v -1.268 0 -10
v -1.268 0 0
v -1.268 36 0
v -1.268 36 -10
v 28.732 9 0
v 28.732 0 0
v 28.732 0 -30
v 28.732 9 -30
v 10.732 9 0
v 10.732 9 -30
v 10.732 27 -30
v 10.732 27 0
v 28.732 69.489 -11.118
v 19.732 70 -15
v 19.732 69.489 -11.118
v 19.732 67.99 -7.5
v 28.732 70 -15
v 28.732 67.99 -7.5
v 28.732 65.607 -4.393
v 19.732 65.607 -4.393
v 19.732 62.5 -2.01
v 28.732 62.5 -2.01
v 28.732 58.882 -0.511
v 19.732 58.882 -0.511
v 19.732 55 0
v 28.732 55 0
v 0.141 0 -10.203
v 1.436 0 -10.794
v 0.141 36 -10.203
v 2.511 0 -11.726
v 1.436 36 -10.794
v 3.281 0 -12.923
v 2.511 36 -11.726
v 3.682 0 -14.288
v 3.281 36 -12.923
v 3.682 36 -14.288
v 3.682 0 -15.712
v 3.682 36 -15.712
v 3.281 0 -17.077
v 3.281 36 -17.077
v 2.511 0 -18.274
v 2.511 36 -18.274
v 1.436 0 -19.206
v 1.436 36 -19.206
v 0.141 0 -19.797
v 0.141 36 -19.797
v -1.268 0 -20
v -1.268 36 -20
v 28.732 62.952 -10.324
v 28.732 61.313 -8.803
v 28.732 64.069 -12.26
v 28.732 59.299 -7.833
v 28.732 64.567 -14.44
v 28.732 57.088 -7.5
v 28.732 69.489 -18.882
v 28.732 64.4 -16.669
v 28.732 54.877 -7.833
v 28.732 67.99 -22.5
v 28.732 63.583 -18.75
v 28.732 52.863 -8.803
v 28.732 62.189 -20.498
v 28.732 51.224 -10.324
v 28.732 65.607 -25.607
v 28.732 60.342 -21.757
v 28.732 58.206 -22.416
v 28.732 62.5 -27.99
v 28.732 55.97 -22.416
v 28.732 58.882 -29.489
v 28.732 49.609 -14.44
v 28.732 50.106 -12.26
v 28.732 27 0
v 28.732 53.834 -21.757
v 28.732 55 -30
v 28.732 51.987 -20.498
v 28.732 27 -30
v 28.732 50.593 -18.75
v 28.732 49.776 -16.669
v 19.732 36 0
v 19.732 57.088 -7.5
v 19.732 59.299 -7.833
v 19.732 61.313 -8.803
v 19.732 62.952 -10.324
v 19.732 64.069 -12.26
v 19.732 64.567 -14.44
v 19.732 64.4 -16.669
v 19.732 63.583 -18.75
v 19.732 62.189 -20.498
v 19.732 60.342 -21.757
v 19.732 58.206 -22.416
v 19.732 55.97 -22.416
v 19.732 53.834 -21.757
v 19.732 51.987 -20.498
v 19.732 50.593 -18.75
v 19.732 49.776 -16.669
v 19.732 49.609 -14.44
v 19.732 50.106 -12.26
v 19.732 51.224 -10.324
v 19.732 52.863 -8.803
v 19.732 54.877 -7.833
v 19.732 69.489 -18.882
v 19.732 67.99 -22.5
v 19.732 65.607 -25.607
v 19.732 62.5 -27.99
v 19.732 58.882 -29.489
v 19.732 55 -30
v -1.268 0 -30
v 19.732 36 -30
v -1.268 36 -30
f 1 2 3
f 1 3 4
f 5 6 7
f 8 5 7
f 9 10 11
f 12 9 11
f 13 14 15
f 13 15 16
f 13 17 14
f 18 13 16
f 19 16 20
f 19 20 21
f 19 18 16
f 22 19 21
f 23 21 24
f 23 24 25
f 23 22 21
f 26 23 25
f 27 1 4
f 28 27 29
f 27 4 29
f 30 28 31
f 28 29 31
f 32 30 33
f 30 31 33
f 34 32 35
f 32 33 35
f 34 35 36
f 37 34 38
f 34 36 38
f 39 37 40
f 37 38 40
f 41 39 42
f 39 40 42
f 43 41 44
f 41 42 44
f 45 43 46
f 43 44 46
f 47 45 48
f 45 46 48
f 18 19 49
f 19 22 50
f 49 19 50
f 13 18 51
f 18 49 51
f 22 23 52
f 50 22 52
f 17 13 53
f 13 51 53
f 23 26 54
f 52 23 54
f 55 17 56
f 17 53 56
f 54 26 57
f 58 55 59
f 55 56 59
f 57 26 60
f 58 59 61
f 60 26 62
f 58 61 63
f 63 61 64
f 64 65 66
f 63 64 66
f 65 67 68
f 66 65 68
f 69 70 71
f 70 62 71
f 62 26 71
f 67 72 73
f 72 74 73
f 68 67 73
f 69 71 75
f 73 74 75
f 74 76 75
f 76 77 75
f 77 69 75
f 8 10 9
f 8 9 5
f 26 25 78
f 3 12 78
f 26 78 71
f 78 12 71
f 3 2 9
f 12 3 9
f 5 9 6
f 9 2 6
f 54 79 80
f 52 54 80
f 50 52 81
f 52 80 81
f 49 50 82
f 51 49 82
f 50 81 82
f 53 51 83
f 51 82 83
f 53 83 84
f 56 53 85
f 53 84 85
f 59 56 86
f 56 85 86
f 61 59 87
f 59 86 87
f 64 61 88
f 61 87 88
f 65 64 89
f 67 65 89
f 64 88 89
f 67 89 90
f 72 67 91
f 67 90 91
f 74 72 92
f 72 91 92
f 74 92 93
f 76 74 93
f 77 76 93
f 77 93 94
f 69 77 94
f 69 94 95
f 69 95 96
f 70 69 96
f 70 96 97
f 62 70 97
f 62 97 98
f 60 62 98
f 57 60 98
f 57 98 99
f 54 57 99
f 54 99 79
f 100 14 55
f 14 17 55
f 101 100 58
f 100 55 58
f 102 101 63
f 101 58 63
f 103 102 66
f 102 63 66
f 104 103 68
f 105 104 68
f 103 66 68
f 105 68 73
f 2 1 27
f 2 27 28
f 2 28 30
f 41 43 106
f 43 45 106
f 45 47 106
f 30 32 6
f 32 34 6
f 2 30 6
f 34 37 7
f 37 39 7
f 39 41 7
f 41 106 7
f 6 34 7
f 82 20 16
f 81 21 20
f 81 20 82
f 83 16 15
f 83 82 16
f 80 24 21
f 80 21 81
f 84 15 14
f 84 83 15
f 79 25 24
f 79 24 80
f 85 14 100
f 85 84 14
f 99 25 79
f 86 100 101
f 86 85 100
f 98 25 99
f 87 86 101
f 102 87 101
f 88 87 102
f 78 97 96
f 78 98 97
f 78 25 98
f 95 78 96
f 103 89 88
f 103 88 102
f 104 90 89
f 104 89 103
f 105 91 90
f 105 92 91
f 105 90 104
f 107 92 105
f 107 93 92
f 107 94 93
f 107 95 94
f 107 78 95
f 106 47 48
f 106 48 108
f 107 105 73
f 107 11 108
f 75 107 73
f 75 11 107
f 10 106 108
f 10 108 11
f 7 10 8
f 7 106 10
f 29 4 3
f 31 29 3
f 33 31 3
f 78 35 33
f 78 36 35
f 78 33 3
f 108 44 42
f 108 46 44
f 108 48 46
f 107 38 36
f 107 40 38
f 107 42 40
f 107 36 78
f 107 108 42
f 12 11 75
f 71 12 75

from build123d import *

# Parameters (mm, degrees)
IZIM1_W                     = 30
IZIM1_H                     = 30
Y_KSEKLIK_EKSTR_ZYON1_DEPTH = 36
IZIM3_W                     = 18
IZIM3_H                     = 18
KES_EKSTR_ZYON2_DEPTH       = 55.968631837
IZIM5_R                     = 5
KES_EKSTR_ZYON3_DEPTH       = 55.968631837
IZIM6_W                     = 9
IZIM6_H                     = 30
Y_KSEKLIK_EKSTR_ZYON2_DEPTH = 34
RADYUS1_R                   = 15
IZIM7_R                     = 7.5
KES_EKSTR_ZYON4_DEPTH       = 80


with BuildPart() as part:
    # Çizim1 → Yükseklik-Ekstrüzyon1 (new body)
    with BuildSketch(Plane(origin=(0, 0, 0), x_dir=(1, 0, 0), z_dir=(0, 1, 0))):
        with Locations((13.732394366, 15)):
            Rectangle(IZIM1_W, IZIM1_H)
    extrude(amount=Y_KSEKLIK_EKSTR_ZYON1_DEPTH)

    # Çizim3 → Kes-Ekstrüzyon2 (cut, through all)
    with BuildSketch(Plane.XY):
        with Locations((19.732394366, 18)):
            Rectangle(IZIM3_W, IZIM3_H)
    extrude(amount=-KES_EKSTR_ZYON2_DEPTH, mode=Mode.SUBTRACT)

    # Çizim5 → Kes-Ekstrüzyon3 (cut, through all)
    with BuildSketch(Plane(origin=(0, 36, 0), x_dir=(1, 0, 0), z_dir=(0, 1, 0))):
        with Locations((-1.267605634, 15)):
            Circle(IZIM5_R)
    extrude(amount=-KES_EKSTR_ZYON3_DEPTH, mode=Mode.SUBTRACT)

    # Çizim6 → Yükseklik-Ekstrüzyon2 (add)
    with BuildSketch(Plane(origin=(0, 36, 0), x_dir=(1, 0, 0), z_dir=(0, 1, 0))):
        with Locations((24.232394366, 15)):
            Rectangle(IZIM6_W, IZIM6_H)
    extrude(amount=Y_KSEKLIK_EKSTR_ZYON2_DEPTH)

    # Radyus1
    radyus1_edges = [part.edges().sort_by_distance(p)[0] for p in [
        (24.232394366, 70, 0),
        (24.232394366, 70, -30),
    ]]
    fillet(radyus1_edges, radius=RADYUS1_R - 0.0001)  # a hair under: the kernel refuses the full size

    # Çizim7 → Kes-Ekstrüzyon4 (cut, through all)
    with BuildSketch(Plane.ZY.offset(-19.732394366)):
        with Locations((-15, 57.087838251)):
            Circle(IZIM7_R)
    extrude(amount=-KES_EKSTR_ZYON4_DEPTH, mode=Mode.SUBTRACT)


solid = part.part
